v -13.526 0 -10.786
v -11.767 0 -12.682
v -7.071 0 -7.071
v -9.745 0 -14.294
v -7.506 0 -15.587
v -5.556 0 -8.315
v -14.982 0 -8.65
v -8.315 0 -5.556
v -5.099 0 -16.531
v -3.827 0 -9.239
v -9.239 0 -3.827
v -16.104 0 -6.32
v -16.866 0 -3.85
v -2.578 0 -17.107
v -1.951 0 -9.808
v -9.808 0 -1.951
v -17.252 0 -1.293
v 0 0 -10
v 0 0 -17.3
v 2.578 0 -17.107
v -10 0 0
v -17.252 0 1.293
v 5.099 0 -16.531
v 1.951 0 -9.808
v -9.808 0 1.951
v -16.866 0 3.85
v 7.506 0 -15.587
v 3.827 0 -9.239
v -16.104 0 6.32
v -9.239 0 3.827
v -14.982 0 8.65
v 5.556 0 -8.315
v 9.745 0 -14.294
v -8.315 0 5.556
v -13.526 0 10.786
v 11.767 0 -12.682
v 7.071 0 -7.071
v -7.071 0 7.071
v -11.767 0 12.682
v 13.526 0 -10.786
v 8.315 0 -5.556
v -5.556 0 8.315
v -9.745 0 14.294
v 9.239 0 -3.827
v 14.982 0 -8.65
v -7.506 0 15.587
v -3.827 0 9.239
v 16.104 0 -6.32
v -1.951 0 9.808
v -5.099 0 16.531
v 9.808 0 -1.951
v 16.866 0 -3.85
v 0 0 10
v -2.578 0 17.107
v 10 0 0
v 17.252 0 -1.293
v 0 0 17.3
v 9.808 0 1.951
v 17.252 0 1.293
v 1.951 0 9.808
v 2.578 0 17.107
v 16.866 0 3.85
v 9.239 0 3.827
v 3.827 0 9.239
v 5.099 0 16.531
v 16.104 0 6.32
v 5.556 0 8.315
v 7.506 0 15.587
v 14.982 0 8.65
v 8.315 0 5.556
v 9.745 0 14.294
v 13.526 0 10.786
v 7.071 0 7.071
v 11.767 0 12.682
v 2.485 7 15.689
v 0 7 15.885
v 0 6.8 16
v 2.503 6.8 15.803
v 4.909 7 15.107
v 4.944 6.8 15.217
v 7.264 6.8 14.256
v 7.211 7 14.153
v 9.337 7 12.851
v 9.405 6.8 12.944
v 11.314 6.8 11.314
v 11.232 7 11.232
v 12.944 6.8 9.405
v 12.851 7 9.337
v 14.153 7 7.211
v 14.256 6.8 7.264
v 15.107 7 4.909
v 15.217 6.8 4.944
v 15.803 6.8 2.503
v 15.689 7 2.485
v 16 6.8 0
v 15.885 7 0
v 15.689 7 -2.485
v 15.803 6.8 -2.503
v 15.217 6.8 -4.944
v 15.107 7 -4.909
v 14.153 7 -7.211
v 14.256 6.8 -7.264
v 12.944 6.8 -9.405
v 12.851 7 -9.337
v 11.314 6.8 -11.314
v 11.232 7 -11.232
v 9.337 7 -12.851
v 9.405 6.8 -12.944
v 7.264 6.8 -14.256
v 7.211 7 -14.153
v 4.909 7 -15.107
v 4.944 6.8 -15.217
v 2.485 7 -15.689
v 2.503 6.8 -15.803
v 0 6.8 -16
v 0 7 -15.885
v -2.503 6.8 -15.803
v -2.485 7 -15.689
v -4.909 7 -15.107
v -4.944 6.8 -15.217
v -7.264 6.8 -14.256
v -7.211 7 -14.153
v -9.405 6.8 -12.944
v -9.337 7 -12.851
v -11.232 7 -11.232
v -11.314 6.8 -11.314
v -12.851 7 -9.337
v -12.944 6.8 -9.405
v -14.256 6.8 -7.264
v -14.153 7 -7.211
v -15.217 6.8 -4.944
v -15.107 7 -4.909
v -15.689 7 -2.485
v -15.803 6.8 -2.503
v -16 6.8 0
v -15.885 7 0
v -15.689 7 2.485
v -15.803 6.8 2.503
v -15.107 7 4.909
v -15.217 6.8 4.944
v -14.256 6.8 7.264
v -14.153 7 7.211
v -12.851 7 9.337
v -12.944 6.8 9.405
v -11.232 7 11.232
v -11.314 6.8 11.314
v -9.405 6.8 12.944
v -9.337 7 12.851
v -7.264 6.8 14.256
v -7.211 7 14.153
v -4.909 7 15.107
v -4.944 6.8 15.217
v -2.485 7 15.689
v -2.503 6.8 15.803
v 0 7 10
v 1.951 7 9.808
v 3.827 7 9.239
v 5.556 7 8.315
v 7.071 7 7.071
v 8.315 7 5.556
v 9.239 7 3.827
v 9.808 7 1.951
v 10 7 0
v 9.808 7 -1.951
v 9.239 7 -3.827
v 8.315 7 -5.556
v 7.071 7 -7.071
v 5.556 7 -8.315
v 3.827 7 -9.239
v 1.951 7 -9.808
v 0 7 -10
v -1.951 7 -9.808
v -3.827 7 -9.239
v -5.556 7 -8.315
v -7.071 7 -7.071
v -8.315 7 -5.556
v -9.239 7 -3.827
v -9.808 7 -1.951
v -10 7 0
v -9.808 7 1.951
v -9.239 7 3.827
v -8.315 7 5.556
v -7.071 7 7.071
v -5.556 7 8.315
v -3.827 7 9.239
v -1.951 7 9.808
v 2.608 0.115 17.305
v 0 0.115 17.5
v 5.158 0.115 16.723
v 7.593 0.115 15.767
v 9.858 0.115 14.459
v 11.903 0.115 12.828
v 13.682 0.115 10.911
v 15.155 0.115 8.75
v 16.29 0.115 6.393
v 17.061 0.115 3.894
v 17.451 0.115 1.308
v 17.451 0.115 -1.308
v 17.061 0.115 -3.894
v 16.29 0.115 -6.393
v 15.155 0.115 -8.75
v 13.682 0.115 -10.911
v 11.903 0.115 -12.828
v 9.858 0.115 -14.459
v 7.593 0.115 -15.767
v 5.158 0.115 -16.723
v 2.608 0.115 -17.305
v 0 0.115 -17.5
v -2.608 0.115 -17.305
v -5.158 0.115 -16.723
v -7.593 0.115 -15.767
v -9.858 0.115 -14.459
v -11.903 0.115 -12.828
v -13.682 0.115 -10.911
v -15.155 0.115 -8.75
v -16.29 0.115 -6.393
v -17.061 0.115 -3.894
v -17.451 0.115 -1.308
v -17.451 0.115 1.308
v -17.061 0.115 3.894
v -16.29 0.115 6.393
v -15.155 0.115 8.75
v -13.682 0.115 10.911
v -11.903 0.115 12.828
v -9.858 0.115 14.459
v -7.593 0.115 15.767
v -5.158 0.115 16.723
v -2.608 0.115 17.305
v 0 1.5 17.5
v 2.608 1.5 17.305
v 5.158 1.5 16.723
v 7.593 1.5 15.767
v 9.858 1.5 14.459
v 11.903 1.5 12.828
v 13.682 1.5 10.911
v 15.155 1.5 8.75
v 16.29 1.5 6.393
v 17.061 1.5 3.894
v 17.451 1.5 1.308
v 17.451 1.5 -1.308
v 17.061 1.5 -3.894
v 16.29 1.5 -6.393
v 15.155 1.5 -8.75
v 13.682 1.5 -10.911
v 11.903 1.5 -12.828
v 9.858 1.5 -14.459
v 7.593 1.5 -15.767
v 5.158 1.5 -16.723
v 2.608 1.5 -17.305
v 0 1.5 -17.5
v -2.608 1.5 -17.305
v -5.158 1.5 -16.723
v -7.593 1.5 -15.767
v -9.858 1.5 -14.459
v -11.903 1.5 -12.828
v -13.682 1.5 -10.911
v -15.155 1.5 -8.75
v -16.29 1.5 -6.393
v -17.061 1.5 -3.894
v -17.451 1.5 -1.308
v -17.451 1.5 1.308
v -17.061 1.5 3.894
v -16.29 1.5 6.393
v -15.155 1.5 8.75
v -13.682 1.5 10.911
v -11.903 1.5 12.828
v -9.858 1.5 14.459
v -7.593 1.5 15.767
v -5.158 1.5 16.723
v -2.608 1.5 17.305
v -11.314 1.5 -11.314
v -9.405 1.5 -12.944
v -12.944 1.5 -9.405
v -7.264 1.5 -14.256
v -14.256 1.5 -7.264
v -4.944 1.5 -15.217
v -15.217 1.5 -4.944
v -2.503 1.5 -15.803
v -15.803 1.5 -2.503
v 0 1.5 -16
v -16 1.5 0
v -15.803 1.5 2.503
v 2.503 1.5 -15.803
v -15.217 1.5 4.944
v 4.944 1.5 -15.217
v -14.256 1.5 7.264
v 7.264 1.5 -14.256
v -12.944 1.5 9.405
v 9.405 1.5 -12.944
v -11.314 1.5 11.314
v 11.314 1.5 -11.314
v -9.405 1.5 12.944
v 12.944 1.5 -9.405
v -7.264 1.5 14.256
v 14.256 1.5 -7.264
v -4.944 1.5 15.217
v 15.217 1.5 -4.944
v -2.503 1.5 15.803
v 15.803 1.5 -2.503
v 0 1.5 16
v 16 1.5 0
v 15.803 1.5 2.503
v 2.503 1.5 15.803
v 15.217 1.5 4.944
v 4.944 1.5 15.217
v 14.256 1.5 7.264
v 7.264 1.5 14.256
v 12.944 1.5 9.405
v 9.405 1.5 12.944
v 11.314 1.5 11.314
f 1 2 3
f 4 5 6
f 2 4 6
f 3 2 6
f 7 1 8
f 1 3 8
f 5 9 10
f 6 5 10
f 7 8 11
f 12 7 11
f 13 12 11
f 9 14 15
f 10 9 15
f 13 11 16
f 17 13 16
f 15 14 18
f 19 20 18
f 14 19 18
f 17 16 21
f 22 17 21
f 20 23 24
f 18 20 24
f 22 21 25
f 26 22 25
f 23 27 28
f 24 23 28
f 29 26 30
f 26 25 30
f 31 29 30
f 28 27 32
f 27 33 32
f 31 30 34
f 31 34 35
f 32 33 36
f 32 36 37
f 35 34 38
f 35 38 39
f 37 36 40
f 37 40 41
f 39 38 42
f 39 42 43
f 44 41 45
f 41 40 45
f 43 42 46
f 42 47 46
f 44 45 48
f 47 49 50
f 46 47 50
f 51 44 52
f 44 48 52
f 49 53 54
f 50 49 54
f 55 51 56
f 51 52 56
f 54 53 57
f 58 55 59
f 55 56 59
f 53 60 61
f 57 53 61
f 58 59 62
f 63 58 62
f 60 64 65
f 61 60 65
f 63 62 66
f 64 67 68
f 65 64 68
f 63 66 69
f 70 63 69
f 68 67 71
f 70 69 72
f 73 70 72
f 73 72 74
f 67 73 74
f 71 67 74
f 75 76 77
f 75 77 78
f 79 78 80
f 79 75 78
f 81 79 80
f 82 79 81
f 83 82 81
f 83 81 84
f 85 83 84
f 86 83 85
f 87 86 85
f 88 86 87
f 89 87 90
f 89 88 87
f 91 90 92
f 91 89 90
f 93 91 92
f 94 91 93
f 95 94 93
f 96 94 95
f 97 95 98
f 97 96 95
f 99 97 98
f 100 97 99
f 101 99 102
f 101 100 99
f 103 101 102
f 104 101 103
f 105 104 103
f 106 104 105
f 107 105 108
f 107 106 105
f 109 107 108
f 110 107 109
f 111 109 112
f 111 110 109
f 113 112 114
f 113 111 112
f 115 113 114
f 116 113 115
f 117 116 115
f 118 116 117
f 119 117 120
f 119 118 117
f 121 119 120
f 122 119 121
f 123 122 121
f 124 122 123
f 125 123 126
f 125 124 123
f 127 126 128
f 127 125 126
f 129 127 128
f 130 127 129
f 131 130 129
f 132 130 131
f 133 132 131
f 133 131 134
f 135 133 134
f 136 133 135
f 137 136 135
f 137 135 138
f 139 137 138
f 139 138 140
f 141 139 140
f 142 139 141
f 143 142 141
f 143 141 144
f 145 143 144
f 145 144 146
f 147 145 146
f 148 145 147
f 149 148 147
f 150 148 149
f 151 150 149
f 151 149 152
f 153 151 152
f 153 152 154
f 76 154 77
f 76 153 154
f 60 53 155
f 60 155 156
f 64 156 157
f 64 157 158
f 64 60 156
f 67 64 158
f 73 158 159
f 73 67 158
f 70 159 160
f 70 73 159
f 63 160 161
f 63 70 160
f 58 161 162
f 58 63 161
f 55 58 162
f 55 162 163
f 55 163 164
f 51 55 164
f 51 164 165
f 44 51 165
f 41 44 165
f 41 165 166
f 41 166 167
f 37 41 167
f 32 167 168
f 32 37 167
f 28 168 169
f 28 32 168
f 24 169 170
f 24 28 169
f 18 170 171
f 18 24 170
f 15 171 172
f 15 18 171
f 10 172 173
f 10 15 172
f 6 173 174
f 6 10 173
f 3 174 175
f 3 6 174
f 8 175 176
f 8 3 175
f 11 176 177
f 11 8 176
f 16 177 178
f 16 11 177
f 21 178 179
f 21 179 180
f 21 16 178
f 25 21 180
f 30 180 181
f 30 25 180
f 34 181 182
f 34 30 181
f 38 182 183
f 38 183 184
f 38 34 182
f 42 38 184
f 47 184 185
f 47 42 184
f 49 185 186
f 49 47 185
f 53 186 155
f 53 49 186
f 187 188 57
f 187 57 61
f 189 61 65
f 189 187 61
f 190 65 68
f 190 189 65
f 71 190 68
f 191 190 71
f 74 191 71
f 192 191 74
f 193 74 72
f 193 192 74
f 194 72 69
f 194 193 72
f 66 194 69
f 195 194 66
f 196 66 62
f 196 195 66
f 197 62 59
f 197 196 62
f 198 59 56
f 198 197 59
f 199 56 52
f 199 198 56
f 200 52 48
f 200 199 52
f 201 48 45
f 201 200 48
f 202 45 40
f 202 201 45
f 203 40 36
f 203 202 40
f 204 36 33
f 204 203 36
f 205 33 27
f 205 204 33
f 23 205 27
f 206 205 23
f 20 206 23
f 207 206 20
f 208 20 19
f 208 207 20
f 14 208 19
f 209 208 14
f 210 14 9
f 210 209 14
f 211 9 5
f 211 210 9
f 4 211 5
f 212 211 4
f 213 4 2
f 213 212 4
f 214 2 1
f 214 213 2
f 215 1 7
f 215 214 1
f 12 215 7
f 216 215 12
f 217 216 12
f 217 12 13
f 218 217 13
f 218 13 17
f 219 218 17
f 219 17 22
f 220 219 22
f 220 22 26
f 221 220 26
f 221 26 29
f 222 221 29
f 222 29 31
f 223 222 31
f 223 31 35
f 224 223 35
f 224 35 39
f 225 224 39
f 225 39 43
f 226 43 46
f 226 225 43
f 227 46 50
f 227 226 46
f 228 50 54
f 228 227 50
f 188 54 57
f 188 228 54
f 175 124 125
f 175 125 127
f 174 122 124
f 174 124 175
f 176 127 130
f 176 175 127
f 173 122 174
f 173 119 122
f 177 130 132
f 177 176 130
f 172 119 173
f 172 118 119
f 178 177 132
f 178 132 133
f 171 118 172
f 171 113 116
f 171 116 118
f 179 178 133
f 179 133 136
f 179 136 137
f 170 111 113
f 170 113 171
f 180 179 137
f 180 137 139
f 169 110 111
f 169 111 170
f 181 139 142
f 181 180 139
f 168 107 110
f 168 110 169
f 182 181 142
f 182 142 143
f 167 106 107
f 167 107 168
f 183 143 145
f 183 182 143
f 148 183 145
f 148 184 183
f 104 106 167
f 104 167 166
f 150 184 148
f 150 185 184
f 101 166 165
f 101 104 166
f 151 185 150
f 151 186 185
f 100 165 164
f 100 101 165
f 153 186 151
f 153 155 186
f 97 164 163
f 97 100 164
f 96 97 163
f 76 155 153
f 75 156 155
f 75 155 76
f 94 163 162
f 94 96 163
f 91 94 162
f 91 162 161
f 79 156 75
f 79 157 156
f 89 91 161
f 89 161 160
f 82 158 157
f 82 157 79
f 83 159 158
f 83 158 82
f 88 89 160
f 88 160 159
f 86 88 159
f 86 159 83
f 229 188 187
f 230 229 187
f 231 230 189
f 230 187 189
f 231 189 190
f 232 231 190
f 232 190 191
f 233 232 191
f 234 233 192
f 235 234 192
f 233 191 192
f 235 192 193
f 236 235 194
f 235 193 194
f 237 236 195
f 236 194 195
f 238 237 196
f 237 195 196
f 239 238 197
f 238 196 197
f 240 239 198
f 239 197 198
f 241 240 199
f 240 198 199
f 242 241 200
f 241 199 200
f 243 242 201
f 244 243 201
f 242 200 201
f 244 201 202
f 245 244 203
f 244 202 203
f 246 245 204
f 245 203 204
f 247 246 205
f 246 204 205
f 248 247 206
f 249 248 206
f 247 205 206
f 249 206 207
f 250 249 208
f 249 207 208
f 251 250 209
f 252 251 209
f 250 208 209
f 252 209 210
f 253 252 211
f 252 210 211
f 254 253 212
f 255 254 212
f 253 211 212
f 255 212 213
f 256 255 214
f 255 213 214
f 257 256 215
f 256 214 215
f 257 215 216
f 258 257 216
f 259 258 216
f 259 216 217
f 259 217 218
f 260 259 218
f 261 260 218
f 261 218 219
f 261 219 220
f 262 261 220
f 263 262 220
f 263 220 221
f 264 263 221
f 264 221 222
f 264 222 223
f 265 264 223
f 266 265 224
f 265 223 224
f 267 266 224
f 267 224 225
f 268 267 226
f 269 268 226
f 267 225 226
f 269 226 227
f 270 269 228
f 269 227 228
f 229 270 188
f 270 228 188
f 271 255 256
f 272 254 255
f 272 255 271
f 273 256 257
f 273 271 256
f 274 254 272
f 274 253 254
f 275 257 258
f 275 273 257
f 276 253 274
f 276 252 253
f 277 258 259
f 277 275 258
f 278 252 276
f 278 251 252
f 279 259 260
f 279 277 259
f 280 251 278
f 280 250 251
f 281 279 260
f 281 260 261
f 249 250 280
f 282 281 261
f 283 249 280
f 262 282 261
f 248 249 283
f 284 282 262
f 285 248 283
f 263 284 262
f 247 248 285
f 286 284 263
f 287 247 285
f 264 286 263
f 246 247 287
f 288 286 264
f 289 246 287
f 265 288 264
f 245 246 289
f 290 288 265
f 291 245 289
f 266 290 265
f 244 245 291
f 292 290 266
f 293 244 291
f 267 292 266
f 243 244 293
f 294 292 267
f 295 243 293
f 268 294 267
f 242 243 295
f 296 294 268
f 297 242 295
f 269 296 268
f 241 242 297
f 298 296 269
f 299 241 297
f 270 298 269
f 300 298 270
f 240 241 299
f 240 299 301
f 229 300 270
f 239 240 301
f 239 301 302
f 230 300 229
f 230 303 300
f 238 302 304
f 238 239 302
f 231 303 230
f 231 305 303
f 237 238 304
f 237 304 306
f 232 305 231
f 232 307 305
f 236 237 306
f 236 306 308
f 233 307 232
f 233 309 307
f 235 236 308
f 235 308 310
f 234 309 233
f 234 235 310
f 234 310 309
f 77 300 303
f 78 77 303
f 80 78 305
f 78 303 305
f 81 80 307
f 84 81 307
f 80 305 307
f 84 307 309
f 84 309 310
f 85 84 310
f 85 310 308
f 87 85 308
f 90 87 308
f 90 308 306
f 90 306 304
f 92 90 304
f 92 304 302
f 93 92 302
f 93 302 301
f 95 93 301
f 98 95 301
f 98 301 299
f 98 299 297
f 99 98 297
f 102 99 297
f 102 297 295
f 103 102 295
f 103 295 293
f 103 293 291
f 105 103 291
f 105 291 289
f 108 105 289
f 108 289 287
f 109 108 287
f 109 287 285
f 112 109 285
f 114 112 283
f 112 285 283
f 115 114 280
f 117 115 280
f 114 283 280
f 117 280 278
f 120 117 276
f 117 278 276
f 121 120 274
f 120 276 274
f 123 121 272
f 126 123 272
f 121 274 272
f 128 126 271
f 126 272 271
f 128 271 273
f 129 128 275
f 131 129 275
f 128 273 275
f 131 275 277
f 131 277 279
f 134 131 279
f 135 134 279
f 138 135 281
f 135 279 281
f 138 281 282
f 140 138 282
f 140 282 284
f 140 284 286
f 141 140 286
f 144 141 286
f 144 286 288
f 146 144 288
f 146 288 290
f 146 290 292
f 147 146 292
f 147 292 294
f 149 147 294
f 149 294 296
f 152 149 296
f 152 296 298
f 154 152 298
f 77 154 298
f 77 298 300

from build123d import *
from OCP.BRepFilletAPI import BRepFilletAPI_MakeChamfer

# Parameters (mm, degrees)
SKETCH_1_R      = 16
SKETCH_1_R_2    = 10
EXTRUDE_1_DEPTH = 7
SKETCH_1_3_R    = 17.5
SKETCH_1_3_R_2  = 16
EXTRUDE_2_DEPTH = 1.5
CHAMFER_1_SIZE  = 0.2
CHAMFER_1_SIZE2 = 0.115470054


with BuildPart() as part:
    # 草图1 → 凸台-拉伸1 (new body)
    with BuildSketch(Plane(origin=(0, 0, 0), x_dir=(1, 0, 0), z_dir=(0, 1, 0))):
        Circle(SKETCH_1_R)
        Circle(SKETCH_1_R_2, mode=Mode.SUBTRACT)
    extrude(amount=EXTRUDE_1_DEPTH)

    # 草图1<3> → 凸台-拉伸2 (add)
    with BuildSketch(Plane(origin=(0, 0, 0), x_dir=(1, 0, 0), z_dir=(0, 1, 0))):
        Circle(SKETCH_1_3_R)
        Circle(SKETCH_1_3_R_2, mode=Mode.SUBTRACT)
    extrude(amount=EXTRUDE_2_DEPTH)

    # 倒角1: one chamfer whose edges measure the first distance from different faces: ONE call of the kernel's chamfer builder (chamfer() names one face for all edges)
    chamfer_1_edges_1 = [part.edges().sort_by_distance(p)[0] for p in [
        (-16, 7, 0),
    ]]
    chamfer_1_side_1 = [part.faces().sort_by_distance(p)[0] for p in [
        (-16, 4.25, 0),
    ]]
    chamfer_1_edges_2 = [part.edges().sort_by_distance(p)[0] for p in [
        (-17.5, 0, 0),
    ]]
    chamfer_1_side_2 = [part.faces().sort_by_distance(p)[0] for p in [
        (-17.005025253, 0, 0),
    ]]
    chamfer_1 = BRepFilletAPI_MakeChamfer(part.part.solid().wrapped)
    for e in chamfer_1_edges_1:
        chamfer_1.Add(CHAMFER_1_SIZE, CHAMFER_1_SIZE2, e.wrapped, chamfer_1_side_1[0].wrapped)  # the first distance lies on this face
    for e in chamfer_1_edges_2:
        chamfer_1.Add(CHAMFER_1_SIZE, CHAMFER_1_SIZE2, e.wrapped, chamfer_1_side_2[0].wrapped)  # the first distance lies on this face
    add(Compound.cast(chamfer_1.Shape()), mode=Mode.REPLACE)


solid = part.part
